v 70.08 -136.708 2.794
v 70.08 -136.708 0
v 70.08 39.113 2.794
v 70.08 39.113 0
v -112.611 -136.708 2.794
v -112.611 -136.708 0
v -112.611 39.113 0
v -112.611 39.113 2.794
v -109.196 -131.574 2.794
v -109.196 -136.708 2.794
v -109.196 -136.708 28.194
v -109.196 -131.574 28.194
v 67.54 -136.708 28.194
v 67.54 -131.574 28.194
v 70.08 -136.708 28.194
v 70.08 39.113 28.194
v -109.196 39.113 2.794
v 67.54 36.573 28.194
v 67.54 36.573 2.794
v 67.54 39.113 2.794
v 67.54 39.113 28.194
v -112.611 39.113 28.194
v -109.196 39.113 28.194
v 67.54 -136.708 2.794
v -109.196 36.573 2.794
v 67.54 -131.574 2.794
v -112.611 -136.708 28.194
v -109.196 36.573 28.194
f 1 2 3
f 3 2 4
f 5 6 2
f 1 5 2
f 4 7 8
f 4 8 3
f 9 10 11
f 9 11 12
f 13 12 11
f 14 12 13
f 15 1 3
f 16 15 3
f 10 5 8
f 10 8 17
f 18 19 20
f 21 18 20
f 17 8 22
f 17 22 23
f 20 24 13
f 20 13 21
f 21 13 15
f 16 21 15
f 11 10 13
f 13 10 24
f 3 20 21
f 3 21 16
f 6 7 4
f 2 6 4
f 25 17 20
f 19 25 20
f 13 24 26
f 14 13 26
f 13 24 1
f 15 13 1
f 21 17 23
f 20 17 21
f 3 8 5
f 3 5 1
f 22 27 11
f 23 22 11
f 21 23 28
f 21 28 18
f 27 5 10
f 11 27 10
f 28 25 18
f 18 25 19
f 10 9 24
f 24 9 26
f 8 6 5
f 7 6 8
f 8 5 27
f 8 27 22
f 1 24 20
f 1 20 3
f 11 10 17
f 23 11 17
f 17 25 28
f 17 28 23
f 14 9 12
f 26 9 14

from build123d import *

# Parameters (mm, degrees)
F0_W      = 182.690583
F0_H      = 175.820373
F1_DEPTH  = 2.794
F2_W      = 2.54
F2_H      = 175.820373
F3_DEPTH  = 25.4
F4_W      = 3.41443
F4_H      = 175.820373
F5_DEPTH  = 25.4
F7_W      = 176.736153
F7_H      = 5.133778
F8_DEPTH  = 25.4
F9_W      = 176.736153
F9_H      = 2.54
F10_DEPTH = 25.4


with BuildPart() as f1:
    # F0 (on Top) → F1 (new body)
    with BuildSketch(Plane.XY):
        with Locations((-21.265443, -48.797674)):
            Rectangle(F0_W, F0_H)
    extrude(amount=F1_DEPTH)


with BuildPart() as f3:
    # F2 (on face) → F3 (new body)
    with BuildSketch(Plane.XY.offset(2.794)):
        with Locations((68.809848, -48.797674)):
            Rectangle(F2_W, F2_H)
    extrude(amount=F3_DEPTH)


with BuildPart() as f5:
    # F4 (on face) → F5 (new body)
    with BuildSketch(Plane.XY.offset(2.794)):
        with Locations((-110.90352, -48.797674)):
            Rectangle(F4_W, F4_H)
    extrude(amount=F5_DEPTH)


with BuildPart() as f8:
    # F7 (on face) → F8 (new body)
    with BuildSketch(Plane.XY.offset(2.794)):
        with Locations((-20.828229, -134.140972)):
            Rectangle(F7_W, F7_H)
    extrude(amount=F8_DEPTH)


with BuildPart() as f10:
    # F9 (on face) → F10 (new body)
    with BuildSketch(Plane.XY.offset(2.794)):
        with Locations((-20.828229, 37.842512)):
            Rectangle(F9_W, F9_H)
    extrude(amount=F10_DEPTH)


solid = Compound([f1.part, f3.part, f5.part, f8.part, f10.part])
